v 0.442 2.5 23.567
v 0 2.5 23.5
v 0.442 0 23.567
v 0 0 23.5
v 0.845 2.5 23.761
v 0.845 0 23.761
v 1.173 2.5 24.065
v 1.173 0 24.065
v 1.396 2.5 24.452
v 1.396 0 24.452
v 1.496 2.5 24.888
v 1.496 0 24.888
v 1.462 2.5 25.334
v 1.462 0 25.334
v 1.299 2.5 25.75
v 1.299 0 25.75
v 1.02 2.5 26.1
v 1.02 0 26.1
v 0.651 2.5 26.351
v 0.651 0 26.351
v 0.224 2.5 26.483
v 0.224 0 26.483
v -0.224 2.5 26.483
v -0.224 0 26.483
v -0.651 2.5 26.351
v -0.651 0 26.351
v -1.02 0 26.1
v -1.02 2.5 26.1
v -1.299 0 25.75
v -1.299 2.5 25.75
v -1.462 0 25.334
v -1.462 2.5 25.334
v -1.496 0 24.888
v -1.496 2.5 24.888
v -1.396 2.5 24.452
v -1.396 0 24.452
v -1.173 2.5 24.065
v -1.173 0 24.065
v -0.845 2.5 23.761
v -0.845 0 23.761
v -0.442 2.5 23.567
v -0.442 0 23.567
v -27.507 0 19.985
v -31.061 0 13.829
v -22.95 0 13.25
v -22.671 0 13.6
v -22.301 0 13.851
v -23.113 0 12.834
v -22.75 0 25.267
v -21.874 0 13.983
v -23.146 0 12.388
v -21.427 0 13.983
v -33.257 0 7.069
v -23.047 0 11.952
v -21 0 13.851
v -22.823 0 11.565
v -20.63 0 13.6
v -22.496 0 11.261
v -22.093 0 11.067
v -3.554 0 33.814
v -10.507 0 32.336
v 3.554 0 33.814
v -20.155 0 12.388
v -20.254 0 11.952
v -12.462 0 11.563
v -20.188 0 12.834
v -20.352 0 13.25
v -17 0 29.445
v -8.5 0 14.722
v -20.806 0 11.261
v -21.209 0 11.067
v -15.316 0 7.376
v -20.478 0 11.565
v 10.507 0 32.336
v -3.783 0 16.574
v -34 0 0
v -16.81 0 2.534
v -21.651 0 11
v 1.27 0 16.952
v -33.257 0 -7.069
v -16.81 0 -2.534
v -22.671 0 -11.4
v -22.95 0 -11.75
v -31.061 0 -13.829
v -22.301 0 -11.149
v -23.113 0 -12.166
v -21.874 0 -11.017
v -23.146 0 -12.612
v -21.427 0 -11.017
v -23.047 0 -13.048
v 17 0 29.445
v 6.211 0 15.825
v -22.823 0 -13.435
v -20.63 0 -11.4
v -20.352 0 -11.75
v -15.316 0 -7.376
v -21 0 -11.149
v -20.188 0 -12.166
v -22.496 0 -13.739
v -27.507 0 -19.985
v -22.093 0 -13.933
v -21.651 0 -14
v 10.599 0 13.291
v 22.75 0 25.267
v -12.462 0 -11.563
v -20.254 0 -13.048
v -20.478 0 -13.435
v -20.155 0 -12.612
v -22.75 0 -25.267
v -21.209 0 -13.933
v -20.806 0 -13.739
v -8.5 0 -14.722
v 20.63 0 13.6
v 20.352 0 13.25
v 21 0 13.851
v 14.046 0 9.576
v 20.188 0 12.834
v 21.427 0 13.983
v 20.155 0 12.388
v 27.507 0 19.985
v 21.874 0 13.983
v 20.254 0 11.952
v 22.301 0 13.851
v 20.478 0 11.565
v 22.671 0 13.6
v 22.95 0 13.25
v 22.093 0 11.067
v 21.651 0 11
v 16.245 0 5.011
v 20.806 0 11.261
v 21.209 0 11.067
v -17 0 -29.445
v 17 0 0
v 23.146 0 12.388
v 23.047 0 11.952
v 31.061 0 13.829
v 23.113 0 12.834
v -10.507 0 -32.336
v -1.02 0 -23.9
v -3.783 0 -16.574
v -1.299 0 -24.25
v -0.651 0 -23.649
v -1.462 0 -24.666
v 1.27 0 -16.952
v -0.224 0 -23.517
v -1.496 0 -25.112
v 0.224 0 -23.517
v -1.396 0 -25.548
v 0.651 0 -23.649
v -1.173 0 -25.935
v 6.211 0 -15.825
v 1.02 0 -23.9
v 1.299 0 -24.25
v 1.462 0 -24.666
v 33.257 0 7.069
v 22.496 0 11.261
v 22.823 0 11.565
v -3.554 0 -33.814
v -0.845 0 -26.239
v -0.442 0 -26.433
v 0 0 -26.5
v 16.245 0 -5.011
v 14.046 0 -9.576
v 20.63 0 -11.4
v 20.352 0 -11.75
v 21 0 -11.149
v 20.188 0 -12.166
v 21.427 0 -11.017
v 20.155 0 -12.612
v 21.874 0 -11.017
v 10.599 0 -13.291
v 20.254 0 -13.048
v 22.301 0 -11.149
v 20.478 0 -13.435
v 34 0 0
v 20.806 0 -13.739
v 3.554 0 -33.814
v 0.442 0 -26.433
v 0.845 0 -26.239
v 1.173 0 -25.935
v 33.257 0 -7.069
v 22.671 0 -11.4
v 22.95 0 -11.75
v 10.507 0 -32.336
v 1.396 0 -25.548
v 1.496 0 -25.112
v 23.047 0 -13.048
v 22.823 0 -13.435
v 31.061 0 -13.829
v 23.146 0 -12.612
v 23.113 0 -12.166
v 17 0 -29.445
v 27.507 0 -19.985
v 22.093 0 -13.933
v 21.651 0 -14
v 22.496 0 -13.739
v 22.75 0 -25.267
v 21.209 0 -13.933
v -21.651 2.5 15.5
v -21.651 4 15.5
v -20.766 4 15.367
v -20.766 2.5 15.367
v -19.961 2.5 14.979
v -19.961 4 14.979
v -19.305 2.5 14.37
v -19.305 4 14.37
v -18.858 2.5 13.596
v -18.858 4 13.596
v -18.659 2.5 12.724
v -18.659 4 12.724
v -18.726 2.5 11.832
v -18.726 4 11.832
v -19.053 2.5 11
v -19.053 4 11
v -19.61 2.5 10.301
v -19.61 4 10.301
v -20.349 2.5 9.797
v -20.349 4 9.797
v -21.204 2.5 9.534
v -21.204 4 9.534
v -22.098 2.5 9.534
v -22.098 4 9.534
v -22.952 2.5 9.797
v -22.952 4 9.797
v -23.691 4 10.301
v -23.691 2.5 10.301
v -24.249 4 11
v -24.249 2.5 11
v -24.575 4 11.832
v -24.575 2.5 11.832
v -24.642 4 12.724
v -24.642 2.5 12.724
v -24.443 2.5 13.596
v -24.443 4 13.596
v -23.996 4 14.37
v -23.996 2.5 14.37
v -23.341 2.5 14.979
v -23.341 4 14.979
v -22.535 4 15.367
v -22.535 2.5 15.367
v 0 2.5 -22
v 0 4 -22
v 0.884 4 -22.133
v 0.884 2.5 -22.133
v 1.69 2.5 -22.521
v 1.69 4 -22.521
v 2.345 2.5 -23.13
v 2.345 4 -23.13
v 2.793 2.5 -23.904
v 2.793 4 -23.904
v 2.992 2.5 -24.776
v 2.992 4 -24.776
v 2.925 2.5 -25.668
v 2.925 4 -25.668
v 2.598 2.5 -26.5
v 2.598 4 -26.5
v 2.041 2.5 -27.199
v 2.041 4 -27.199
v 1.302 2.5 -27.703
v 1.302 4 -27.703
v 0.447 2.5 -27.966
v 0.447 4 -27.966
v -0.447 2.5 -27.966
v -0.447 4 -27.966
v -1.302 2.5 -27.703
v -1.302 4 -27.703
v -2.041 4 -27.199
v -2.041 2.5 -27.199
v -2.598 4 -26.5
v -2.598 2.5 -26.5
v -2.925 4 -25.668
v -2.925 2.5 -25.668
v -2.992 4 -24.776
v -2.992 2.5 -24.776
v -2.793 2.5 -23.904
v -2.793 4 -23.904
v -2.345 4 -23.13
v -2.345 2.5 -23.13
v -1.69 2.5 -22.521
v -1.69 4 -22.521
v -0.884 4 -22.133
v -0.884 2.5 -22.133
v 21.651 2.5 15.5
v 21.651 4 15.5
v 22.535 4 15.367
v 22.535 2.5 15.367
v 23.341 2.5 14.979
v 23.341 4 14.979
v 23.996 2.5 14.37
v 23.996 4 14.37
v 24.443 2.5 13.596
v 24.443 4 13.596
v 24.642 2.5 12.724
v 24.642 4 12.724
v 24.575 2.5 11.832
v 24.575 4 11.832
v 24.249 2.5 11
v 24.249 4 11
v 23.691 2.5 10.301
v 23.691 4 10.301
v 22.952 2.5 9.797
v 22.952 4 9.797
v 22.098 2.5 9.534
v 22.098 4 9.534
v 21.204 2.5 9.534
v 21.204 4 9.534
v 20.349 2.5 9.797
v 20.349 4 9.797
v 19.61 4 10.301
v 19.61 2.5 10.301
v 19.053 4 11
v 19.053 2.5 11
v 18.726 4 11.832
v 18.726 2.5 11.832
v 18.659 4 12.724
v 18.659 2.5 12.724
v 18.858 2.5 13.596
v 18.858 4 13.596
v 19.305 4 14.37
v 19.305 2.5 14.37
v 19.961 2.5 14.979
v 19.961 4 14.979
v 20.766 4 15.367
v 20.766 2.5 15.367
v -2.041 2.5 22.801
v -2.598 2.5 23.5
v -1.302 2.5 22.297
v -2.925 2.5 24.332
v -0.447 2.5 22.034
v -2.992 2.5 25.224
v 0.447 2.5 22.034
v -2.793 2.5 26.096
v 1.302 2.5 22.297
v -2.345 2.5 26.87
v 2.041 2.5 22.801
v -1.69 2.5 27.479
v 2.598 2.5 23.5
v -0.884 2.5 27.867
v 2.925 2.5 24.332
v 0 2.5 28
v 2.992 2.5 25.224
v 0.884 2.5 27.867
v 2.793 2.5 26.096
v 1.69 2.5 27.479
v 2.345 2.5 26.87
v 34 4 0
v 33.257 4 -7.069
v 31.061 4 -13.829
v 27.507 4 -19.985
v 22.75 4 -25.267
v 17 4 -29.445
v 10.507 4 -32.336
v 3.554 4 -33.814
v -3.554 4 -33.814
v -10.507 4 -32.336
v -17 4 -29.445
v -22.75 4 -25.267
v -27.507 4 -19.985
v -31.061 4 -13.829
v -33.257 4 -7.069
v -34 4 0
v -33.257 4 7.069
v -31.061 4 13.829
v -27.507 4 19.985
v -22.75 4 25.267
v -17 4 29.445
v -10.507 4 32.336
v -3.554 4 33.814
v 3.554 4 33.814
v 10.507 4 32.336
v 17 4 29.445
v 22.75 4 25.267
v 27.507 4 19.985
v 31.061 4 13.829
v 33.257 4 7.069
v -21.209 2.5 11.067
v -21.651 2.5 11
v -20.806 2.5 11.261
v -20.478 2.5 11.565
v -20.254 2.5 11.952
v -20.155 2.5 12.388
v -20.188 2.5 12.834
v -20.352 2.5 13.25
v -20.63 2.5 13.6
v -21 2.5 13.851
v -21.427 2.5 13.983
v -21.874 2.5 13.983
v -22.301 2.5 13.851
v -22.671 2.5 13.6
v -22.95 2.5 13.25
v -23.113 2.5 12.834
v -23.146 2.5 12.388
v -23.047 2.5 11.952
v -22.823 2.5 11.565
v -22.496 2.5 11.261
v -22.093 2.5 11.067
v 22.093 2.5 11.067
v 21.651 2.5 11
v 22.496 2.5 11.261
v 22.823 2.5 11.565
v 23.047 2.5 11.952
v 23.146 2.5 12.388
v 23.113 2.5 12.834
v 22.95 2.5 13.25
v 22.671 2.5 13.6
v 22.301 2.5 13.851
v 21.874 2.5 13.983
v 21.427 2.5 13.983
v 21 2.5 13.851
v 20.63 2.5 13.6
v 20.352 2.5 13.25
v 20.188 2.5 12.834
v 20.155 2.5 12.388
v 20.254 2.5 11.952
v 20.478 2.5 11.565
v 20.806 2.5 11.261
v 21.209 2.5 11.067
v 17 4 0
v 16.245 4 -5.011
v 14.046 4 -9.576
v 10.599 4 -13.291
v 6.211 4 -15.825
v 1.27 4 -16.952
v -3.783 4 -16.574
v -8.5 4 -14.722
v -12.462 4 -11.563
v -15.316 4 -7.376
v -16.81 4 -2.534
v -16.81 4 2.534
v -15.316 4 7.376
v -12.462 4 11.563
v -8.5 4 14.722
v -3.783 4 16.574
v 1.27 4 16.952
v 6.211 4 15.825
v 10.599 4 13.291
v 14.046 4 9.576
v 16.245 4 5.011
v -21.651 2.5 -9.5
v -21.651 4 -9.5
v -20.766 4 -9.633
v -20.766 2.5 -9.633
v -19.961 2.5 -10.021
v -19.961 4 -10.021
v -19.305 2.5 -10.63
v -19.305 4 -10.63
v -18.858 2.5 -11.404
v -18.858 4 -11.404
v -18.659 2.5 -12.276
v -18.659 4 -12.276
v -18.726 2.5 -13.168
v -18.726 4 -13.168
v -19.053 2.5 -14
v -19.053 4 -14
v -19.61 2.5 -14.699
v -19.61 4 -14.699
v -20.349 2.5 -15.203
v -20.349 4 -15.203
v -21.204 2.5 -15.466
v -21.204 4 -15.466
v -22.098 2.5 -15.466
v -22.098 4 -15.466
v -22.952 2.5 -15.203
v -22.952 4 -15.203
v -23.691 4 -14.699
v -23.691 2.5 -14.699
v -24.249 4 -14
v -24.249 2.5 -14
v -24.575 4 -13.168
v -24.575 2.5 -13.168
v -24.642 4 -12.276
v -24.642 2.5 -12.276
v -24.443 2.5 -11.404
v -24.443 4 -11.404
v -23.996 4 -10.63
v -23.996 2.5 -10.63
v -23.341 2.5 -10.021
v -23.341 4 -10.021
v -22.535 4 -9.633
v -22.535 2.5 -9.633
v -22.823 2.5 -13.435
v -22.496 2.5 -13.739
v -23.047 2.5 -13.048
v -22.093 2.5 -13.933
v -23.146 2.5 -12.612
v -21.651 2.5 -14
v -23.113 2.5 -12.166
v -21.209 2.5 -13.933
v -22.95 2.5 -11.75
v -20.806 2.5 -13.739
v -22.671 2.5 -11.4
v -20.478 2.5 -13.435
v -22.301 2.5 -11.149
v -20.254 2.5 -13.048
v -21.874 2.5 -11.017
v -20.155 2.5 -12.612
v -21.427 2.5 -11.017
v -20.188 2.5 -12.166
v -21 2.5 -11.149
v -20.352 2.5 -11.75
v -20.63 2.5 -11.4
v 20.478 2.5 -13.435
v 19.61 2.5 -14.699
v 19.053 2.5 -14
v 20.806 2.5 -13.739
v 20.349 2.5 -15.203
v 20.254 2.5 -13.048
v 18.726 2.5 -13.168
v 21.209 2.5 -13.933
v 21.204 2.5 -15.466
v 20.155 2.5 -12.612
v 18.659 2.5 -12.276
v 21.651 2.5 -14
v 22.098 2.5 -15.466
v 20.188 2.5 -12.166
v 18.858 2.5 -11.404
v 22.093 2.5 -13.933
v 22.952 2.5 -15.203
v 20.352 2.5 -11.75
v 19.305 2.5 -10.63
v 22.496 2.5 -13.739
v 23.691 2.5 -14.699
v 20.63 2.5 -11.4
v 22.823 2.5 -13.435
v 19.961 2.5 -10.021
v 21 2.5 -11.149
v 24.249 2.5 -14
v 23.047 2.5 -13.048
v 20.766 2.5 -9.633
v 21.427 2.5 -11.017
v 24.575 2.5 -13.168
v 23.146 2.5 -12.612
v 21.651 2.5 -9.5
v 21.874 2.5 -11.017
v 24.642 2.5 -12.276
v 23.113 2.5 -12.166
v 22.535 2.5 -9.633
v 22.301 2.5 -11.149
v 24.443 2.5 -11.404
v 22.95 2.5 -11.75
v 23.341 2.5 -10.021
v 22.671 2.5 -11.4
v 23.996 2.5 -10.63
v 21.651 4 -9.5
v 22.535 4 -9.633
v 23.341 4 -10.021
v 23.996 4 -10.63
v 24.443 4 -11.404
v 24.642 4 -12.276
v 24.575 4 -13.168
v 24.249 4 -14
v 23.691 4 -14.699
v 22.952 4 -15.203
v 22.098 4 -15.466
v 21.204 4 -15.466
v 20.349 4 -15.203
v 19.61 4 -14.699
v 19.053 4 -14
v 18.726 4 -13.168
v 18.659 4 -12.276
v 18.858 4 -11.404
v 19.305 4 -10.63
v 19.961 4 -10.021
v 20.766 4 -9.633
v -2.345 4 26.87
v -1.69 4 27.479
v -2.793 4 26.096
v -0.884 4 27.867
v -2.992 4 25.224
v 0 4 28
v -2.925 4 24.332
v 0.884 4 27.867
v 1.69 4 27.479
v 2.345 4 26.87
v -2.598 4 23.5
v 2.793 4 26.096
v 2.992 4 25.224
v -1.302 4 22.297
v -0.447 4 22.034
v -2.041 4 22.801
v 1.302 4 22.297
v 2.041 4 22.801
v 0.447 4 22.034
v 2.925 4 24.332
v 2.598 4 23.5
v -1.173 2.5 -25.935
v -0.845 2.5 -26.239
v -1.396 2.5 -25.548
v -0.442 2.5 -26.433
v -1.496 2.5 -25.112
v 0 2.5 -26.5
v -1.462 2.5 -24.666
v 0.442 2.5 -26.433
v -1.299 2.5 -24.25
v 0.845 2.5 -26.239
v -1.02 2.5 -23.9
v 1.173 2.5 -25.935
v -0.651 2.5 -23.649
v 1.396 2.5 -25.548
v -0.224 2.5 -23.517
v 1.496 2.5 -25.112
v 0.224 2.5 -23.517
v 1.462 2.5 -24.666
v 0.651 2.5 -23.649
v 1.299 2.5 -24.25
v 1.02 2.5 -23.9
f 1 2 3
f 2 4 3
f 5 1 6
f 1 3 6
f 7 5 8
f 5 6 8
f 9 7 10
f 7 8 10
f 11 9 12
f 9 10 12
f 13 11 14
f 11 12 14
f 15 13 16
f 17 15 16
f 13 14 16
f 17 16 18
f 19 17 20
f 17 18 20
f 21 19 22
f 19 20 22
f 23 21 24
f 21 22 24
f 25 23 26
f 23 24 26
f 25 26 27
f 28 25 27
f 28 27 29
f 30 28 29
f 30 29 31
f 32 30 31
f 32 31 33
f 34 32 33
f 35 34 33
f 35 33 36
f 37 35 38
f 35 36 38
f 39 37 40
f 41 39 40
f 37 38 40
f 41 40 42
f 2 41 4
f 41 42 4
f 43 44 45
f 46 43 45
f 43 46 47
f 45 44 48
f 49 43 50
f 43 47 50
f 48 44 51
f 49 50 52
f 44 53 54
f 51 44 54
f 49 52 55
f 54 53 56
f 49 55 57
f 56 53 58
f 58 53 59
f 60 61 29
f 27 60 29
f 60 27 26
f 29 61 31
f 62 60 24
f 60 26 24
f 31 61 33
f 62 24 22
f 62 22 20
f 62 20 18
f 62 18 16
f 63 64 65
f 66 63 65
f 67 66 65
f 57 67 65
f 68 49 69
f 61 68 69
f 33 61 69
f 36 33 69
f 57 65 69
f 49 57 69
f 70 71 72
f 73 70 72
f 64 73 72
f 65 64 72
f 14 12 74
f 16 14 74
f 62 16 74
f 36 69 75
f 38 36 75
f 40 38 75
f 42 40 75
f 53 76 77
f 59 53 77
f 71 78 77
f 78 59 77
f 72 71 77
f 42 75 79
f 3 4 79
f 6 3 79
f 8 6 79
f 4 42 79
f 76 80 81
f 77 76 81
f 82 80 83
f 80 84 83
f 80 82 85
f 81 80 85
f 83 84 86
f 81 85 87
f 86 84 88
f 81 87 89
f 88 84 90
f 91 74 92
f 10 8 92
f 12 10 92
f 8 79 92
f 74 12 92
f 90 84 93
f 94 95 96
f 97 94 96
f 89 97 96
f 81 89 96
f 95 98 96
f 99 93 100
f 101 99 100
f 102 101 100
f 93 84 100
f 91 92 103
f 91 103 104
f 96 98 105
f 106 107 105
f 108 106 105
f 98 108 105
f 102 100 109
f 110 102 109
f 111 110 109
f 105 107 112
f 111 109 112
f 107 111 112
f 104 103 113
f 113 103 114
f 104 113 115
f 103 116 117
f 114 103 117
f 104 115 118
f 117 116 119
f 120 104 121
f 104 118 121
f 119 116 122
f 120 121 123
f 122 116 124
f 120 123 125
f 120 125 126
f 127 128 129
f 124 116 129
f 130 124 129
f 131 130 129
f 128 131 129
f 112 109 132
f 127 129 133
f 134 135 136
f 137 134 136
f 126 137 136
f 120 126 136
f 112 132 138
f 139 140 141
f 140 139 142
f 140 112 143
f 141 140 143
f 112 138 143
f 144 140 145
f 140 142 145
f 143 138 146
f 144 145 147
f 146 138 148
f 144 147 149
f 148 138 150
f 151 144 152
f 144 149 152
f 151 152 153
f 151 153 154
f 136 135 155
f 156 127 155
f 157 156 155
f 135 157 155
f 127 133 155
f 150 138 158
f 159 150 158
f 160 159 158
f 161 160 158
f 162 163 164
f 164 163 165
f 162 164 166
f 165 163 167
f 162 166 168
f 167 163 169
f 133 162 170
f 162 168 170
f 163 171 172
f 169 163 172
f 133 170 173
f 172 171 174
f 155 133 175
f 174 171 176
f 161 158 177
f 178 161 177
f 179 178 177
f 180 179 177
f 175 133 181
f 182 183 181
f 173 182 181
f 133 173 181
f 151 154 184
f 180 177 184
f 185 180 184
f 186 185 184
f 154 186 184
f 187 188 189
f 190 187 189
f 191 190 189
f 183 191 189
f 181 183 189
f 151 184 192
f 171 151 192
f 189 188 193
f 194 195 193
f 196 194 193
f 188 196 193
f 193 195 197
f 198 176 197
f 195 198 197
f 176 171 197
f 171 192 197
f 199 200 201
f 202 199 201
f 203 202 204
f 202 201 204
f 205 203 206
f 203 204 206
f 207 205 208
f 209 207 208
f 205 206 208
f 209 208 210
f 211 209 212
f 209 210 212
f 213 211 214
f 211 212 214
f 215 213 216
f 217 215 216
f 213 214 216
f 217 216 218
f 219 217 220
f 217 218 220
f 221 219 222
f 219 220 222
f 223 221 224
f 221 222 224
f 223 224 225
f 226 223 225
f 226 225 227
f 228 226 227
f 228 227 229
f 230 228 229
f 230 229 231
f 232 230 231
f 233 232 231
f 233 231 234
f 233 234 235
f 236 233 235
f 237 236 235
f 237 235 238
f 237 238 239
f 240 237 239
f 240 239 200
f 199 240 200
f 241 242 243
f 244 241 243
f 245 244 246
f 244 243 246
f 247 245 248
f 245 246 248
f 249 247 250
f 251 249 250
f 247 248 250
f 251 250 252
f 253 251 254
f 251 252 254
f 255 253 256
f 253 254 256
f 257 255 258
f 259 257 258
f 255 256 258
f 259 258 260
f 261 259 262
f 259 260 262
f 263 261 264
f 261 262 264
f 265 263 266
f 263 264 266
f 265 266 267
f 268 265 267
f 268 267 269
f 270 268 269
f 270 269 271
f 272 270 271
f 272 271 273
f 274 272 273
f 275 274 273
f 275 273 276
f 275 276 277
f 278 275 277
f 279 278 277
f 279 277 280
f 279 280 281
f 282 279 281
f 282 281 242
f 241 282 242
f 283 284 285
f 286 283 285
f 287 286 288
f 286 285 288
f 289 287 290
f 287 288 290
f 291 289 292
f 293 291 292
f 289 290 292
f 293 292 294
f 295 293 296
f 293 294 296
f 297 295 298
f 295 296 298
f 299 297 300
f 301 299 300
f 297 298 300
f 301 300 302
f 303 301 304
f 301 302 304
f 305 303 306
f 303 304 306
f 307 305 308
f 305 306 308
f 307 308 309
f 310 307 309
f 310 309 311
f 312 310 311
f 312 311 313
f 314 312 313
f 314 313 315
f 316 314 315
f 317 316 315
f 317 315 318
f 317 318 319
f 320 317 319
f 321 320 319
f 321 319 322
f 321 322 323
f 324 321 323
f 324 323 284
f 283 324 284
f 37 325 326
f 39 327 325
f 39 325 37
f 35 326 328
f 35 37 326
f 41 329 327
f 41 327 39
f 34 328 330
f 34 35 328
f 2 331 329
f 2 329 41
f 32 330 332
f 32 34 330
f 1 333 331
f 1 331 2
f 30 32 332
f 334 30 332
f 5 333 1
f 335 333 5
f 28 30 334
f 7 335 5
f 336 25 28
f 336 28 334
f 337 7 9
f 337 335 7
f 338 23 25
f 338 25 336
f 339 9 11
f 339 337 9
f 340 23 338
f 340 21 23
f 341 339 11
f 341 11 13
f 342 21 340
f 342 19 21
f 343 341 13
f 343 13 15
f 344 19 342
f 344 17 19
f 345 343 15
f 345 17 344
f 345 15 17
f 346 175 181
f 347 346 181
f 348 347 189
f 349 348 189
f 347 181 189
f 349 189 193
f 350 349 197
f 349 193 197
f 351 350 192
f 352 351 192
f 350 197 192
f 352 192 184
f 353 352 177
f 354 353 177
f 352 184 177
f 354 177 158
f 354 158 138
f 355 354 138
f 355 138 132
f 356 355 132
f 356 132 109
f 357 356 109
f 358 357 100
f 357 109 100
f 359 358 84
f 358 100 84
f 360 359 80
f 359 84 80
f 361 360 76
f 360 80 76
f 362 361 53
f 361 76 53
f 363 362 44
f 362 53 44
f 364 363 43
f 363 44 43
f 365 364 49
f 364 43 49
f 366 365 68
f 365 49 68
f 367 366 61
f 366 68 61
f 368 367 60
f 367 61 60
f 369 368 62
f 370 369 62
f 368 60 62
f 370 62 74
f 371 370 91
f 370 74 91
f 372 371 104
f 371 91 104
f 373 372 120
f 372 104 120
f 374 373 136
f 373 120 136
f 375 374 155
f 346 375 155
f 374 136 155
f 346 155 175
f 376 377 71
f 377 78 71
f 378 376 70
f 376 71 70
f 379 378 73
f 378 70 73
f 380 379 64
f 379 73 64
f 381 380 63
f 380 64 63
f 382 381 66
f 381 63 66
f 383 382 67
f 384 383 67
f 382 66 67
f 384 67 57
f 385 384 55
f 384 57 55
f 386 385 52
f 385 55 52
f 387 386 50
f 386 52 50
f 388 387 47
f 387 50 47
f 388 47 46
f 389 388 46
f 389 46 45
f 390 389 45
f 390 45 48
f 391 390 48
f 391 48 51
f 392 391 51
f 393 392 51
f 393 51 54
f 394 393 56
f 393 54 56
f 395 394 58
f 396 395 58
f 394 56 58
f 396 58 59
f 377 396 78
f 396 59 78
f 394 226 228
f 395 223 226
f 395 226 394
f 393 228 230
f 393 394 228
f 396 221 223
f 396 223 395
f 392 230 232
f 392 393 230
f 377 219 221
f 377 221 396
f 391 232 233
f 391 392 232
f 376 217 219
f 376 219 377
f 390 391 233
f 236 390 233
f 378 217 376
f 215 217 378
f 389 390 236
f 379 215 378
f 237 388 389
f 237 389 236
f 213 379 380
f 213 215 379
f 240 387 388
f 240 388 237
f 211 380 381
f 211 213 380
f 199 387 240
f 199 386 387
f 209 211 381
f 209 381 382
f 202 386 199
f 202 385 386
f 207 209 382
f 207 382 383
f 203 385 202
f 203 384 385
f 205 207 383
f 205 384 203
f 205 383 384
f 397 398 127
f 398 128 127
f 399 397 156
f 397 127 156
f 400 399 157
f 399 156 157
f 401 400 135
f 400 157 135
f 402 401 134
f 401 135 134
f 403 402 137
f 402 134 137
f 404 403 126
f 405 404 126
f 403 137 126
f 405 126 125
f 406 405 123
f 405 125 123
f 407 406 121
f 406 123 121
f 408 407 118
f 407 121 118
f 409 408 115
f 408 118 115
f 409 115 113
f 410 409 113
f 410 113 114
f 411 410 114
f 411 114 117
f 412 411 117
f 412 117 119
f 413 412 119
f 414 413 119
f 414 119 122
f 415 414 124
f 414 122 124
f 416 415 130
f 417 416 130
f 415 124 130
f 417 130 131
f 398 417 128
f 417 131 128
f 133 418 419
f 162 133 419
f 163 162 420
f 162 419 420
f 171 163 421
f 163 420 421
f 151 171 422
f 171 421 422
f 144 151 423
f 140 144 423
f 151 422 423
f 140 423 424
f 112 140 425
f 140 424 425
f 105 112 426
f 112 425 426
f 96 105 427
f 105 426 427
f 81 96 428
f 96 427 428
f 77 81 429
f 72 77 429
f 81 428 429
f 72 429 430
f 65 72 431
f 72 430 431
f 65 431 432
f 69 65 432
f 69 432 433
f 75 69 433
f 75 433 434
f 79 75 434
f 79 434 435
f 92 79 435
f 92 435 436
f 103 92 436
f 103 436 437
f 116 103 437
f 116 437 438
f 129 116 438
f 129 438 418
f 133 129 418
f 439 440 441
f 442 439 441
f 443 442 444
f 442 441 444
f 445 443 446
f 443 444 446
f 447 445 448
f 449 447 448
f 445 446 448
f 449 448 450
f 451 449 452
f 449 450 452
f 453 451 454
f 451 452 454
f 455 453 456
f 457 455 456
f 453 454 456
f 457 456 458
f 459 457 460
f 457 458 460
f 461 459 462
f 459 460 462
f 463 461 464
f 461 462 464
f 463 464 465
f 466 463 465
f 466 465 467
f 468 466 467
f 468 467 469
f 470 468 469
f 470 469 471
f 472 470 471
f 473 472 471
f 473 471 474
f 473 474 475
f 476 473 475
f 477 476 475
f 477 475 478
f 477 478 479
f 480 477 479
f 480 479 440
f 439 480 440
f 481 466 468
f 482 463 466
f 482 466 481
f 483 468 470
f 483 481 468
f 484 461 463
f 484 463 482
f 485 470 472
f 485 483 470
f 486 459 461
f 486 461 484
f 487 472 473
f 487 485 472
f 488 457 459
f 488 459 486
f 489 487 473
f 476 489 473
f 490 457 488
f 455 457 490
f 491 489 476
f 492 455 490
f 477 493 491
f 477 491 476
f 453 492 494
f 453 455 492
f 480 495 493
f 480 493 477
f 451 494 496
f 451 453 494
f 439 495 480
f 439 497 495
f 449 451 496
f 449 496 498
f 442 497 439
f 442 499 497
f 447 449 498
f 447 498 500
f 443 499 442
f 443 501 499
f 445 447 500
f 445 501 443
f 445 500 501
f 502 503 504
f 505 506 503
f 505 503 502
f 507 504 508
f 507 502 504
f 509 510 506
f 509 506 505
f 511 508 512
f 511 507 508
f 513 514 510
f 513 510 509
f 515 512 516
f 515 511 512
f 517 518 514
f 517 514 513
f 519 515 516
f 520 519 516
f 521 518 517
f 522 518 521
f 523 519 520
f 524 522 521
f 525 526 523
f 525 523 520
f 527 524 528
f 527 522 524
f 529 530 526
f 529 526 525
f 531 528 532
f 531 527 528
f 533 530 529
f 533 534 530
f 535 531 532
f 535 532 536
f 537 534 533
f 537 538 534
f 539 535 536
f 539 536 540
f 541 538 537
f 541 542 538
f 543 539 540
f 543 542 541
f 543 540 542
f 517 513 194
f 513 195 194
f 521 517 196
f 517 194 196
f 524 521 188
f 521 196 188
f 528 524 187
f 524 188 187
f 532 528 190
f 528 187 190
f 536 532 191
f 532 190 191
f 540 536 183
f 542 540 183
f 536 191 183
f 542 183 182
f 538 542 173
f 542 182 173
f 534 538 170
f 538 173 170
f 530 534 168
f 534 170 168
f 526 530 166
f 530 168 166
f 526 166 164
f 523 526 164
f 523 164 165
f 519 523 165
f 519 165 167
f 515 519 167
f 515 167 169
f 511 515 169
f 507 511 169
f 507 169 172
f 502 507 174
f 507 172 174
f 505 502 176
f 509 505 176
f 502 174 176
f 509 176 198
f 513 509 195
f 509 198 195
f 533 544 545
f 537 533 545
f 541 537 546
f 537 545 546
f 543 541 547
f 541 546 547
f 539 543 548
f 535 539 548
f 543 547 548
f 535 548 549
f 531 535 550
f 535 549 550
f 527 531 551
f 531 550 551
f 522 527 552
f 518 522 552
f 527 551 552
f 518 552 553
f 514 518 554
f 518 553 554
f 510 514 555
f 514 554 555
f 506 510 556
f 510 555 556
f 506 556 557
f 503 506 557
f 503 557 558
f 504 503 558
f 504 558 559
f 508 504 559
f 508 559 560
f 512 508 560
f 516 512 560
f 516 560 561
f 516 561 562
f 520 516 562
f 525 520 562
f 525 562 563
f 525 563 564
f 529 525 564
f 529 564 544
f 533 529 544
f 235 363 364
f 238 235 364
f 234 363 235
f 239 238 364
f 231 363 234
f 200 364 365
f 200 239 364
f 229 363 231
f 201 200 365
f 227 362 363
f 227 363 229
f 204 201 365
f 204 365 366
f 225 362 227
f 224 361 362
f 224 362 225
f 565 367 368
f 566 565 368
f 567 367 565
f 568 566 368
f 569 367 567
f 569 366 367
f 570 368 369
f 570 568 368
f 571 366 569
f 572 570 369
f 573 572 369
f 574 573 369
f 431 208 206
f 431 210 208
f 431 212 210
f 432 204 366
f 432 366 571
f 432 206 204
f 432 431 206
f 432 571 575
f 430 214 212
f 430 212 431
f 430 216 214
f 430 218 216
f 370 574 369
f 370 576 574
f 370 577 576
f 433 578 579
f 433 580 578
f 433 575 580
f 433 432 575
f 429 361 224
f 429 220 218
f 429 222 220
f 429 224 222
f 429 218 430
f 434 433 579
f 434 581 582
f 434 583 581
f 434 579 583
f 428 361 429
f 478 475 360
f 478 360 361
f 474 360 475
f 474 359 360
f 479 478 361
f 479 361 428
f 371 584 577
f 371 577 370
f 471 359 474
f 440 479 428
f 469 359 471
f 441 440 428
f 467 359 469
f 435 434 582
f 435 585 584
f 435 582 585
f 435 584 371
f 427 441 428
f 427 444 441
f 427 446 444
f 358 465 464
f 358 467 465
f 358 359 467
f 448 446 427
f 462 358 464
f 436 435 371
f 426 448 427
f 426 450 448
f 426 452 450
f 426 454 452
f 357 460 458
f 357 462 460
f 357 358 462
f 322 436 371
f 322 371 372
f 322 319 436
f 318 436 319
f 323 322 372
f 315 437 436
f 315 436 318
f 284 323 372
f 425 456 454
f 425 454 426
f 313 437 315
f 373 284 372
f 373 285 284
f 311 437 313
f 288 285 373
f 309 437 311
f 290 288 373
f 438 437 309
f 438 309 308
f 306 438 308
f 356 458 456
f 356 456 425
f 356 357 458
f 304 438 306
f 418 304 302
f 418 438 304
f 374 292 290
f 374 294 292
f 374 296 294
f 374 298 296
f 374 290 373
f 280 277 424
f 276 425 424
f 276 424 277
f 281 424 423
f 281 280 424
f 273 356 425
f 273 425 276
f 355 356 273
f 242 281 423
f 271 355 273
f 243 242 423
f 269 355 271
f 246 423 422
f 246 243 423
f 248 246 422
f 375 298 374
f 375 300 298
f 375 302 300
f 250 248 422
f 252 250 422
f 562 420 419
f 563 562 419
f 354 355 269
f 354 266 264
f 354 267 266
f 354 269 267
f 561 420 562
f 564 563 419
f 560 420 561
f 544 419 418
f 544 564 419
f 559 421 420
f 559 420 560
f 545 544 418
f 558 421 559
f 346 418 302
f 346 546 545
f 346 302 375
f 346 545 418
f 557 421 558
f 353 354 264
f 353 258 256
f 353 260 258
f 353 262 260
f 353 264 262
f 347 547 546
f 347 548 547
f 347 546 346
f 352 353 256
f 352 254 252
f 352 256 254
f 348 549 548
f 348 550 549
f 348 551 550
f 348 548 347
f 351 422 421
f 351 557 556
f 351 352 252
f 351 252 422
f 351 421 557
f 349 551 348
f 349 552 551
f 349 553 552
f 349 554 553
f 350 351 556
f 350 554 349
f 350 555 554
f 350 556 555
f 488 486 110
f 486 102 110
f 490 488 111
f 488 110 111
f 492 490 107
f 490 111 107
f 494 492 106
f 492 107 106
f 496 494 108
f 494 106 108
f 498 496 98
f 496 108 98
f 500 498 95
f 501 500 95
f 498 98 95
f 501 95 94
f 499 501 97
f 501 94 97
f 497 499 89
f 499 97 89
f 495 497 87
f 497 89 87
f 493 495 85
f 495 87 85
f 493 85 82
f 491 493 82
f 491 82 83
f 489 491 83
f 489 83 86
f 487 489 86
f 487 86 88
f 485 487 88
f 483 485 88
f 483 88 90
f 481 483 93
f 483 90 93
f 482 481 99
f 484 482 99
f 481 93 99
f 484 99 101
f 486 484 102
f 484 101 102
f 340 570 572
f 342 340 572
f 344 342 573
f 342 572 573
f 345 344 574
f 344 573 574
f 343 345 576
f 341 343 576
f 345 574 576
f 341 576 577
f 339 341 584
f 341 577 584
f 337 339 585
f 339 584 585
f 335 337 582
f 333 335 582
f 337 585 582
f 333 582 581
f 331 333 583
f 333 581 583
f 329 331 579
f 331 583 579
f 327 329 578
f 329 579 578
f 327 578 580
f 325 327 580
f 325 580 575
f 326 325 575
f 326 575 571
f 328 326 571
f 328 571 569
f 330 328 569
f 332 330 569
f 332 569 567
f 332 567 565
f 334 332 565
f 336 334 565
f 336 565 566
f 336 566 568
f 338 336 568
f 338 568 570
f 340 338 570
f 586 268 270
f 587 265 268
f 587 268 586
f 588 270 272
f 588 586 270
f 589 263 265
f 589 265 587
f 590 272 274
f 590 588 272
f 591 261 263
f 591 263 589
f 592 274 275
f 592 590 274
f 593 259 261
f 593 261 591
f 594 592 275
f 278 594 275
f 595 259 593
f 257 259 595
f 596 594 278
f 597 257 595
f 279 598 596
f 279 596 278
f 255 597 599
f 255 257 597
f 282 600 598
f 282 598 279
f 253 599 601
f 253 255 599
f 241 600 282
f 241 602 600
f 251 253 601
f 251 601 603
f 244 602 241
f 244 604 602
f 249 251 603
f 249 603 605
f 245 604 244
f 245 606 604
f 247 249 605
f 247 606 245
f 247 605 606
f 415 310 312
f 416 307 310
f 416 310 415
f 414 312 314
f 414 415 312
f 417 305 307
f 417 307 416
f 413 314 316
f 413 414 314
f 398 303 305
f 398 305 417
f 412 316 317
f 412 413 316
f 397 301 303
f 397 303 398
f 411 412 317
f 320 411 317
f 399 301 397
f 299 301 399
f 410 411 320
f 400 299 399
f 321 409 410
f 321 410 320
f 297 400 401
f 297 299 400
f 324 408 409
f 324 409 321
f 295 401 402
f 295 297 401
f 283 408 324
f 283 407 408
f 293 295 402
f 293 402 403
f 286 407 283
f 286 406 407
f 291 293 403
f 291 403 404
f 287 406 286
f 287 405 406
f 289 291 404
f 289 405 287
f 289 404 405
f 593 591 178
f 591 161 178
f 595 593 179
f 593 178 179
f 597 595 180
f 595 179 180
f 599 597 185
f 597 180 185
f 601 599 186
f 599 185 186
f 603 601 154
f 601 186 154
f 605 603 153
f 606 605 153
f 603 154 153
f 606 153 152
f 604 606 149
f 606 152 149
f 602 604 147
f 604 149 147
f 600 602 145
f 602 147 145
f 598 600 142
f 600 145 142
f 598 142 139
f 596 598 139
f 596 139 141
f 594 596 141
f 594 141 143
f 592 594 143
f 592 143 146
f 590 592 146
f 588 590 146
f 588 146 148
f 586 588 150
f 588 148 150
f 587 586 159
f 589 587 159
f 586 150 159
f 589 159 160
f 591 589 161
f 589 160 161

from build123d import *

# Parameters (mm, degrees)
SKETCH1_R           = 34
BOSS_EXTRUDE1_DEPTH = 4
HOLE1_D             = 3
HOLE1_DEPTH         = 5
HOLE1_CBORE_D       = 6
HOLE1_CBORE_DEPTH   = 1.5
SKETCH2_R           = 17
CUT_EXTRUDE1_DEPTH  = 5


with BuildPart() as part:
    # Sketch1 → Boss-Extrude1 (new body)
    with BuildSketch(Plane(origin=(0, 0, 0), x_dir=(1, 0, 0), z_dir=(0, 1, 0))):
        Circle(SKETCH1_R)
    extrude(amount=BOSS_EXTRUDE1_DEPTH)

    # Hole1
    with Locations(Plane(origin=(0, 4, -25), x_dir=(0, 0, 1), z_dir=(0, 1, 0))):
        with Locations((0, 0), (12.5, 21.650635095), (37.5, 21.650635095), (50, 0), (37.5, -21.650635095), (12.5, -21.650635095)):
            CounterBoreHole(HOLE1_D / 2, HOLE1_CBORE_D / 2, HOLE1_CBORE_DEPTH, depth=HOLE1_DEPTH)

    # Sketch2 → Cut-Extrude1 (cut)
    with BuildSketch(Plane(origin=(0, 4, 0), x_dir=(1, 0, 0), z_dir=(0, 1, 0))):
        Circle(SKETCH2_R)
    extrude(amount=-CUT_EXTRUDE1_DEPTH, mode=Mode.SUBTRACT)


solid = part.part
